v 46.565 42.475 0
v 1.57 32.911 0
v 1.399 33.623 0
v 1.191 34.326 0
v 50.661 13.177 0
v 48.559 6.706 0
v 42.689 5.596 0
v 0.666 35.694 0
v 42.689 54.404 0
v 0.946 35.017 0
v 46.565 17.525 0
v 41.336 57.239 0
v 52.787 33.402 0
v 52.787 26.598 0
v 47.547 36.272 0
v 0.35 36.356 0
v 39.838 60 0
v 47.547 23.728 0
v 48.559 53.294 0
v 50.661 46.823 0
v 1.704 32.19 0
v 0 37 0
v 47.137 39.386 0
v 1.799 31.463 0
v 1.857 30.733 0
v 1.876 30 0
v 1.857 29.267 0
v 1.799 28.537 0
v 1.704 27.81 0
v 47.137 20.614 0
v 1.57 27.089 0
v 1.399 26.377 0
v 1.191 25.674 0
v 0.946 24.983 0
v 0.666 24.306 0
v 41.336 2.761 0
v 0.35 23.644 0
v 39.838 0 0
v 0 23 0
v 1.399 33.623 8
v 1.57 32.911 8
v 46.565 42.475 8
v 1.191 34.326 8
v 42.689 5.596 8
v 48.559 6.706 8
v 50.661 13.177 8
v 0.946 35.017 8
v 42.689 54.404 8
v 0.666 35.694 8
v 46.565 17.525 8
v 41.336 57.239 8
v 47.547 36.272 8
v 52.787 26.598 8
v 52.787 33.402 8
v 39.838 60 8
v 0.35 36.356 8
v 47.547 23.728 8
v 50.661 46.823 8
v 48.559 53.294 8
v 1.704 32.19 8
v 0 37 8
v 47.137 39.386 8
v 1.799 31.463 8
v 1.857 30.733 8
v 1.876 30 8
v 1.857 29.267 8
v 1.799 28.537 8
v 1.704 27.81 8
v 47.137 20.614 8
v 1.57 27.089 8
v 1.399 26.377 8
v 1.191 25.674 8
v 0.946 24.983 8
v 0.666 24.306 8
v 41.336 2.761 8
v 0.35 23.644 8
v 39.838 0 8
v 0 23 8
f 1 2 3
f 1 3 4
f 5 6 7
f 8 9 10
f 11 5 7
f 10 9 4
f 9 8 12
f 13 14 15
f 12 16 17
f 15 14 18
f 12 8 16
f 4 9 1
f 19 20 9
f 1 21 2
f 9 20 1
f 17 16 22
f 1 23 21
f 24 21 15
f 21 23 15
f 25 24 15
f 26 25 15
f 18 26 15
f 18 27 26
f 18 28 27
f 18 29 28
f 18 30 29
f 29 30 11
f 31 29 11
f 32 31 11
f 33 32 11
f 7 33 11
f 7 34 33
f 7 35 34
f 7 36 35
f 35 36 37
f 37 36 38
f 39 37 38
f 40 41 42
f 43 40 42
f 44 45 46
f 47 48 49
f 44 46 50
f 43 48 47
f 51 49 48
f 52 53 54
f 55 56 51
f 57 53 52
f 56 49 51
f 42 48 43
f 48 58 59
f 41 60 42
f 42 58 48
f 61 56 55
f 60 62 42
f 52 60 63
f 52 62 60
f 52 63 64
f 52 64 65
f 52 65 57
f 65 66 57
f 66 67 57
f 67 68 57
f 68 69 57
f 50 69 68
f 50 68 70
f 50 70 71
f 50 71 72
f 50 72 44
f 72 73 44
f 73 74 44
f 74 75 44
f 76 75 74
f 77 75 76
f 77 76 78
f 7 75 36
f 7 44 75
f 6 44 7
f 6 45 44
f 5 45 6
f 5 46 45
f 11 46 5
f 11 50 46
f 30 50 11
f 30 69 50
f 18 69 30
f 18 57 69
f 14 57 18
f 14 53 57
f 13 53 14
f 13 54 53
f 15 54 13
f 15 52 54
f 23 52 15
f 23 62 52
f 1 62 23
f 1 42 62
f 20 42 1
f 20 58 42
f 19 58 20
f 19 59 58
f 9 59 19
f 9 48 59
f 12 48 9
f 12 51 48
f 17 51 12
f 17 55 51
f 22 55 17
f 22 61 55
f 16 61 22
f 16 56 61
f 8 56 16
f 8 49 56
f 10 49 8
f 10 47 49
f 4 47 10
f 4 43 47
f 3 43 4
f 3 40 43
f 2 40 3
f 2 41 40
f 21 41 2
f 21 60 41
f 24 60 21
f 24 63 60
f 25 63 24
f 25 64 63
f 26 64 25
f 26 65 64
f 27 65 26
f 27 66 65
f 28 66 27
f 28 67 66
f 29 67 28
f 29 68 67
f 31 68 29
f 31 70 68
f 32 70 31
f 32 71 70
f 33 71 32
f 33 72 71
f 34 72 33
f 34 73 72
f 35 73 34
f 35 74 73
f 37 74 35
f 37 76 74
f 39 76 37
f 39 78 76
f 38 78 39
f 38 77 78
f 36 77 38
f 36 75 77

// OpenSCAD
$fn = 32;

// ----------------------------------------------------------------------
// Gear sector: 3 teeth on 60 degrees
// ----------------------------------------------------------------------

// --- parameters (mm) ---
sector_angle = 60;        // sector angle, degrees
root_r = 60;              // root circle radius
tooth_h = 5;              // tooth height over the root circle
teeth = 3;                // number of teeth on the sector
hub_r = 14;               // hub bore radius
plate_t = 8;              // sector thickness, Z
arc_step = 3;             // sampling step of the root/hub arcs, degrees

tip_r = root_r + tooth_h;  // tip circle radius

profile = [[39.838, 0], [41.336, 2.761], [42.689, 5.596], [48.559, 6.706], [50.661, 13.177], [46.565, 17.525], [47.137, 20.614], [47.547, 23.728], [52.787, 26.598], [52.787, 33.402], [47.547, 36.272], [47.137, 39.386], [46.565, 42.475], [50.661, 46.823], [48.559, 53.294], [42.689, 54.404], [41.336, 57.239], [39.838, 60], [0, 37], [0.35, 36.356], [0.666, 35.694], [0.946, 35.017], [1.191, 34.326], [1.399, 33.623], [1.57, 32.911], [1.704, 32.19], [1.799, 31.463], [1.857, 30.733], [1.876, 30], [1.857, 29.267], [1.799, 28.537], [1.704, 27.81], [1.57, 27.089], [1.399, 26.377], [1.191, 25.674], [0.946, 24.983], [0.666, 24.306], [0.35, 23.644], [0, 23]];  // primary outline, 39 points, counter clockwise

// --- the one profile operation ---
linear_extrude(height = plate_t) polygon(points = profile);
